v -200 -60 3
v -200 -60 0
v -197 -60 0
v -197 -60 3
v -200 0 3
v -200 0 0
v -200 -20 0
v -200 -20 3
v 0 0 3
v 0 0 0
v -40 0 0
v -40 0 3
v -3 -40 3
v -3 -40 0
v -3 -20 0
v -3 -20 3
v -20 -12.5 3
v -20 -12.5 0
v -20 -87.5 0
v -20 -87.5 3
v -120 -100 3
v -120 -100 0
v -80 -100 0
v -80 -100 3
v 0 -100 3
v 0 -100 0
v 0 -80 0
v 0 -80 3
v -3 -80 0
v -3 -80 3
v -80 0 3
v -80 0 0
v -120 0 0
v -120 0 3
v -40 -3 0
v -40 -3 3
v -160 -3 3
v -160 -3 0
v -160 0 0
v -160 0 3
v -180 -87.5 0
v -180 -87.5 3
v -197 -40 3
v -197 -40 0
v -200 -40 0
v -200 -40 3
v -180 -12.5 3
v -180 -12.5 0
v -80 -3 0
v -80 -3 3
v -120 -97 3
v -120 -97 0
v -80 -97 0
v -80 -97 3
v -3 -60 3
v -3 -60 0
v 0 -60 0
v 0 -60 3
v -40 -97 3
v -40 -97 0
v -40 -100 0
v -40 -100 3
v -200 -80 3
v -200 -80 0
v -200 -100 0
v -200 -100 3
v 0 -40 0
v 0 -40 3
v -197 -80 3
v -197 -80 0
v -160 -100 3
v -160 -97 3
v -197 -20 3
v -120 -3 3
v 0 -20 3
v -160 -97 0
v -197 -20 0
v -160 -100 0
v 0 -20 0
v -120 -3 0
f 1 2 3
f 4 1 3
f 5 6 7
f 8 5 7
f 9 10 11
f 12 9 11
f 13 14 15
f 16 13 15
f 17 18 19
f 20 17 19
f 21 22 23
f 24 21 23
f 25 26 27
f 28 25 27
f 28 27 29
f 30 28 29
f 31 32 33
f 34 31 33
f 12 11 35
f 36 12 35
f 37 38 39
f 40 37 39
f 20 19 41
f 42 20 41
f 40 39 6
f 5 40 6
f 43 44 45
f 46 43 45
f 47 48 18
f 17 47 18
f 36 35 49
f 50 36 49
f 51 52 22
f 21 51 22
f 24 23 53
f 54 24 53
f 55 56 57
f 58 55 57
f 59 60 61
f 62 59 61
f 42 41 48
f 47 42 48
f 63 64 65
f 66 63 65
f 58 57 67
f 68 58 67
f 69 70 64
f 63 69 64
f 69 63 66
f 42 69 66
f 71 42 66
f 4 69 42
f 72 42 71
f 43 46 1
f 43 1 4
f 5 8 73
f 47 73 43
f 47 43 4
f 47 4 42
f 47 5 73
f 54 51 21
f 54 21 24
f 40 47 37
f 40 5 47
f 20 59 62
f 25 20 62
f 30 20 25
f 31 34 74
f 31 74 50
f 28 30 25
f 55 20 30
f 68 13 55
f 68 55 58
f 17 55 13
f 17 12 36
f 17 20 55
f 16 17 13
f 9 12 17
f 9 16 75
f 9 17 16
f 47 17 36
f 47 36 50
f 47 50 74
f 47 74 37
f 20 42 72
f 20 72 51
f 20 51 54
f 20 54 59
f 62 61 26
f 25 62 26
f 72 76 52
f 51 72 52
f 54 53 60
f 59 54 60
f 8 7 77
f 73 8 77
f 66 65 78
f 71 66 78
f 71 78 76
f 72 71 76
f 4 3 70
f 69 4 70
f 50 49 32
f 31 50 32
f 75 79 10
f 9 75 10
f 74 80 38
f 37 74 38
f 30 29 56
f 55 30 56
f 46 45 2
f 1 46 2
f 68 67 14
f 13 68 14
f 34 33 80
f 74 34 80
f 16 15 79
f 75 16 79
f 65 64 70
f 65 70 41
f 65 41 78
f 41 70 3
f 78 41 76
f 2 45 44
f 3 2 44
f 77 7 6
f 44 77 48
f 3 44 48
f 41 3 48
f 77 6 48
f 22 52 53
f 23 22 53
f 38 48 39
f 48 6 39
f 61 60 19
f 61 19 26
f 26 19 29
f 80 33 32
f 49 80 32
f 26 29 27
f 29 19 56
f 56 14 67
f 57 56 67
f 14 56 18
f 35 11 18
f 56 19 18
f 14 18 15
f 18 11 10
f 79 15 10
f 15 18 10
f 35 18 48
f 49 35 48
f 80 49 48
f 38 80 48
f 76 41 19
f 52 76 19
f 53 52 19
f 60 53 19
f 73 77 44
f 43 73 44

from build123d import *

# Parameters (mm, degrees)
F1_DEPTH = 3


with BuildPart() as f1:
    # F0 (on Top) → F1 (new body)
    with BuildSketch(Plane.XY):
        Polygon((0, -20), (0, 0), (-40, 0), (-40, -3), (-80, -3), (-80, 0), (-120, 0), (-120, -3), (-160, -3), (-160, 0), (-200, 0), (-200, -20), (-197, -20), (-197, -40), (-200, -40), (-200, -60), (-197, -60), (-197, -80), (-200, -80), (-200, -100), (-160, -100), (-160, -97), (-120, -97), (-120, -100), (-80, -100), (-80, -97), (-40, -97), (-40, -100), (0, -100), (0, -80), (-3, -80), (-3, -60), (0, -60), (0, -40), (-3, -40), (-3, -20), align=None)
        Polygon((-180, -12.5), (-100, -12.5), (-20, -12.5), (-20, -87.5), (-180, -87.5), align=None, mode=Mode.SUBTRACT)
    extrude(amount=F1_DEPTH)


solid = f1.part
